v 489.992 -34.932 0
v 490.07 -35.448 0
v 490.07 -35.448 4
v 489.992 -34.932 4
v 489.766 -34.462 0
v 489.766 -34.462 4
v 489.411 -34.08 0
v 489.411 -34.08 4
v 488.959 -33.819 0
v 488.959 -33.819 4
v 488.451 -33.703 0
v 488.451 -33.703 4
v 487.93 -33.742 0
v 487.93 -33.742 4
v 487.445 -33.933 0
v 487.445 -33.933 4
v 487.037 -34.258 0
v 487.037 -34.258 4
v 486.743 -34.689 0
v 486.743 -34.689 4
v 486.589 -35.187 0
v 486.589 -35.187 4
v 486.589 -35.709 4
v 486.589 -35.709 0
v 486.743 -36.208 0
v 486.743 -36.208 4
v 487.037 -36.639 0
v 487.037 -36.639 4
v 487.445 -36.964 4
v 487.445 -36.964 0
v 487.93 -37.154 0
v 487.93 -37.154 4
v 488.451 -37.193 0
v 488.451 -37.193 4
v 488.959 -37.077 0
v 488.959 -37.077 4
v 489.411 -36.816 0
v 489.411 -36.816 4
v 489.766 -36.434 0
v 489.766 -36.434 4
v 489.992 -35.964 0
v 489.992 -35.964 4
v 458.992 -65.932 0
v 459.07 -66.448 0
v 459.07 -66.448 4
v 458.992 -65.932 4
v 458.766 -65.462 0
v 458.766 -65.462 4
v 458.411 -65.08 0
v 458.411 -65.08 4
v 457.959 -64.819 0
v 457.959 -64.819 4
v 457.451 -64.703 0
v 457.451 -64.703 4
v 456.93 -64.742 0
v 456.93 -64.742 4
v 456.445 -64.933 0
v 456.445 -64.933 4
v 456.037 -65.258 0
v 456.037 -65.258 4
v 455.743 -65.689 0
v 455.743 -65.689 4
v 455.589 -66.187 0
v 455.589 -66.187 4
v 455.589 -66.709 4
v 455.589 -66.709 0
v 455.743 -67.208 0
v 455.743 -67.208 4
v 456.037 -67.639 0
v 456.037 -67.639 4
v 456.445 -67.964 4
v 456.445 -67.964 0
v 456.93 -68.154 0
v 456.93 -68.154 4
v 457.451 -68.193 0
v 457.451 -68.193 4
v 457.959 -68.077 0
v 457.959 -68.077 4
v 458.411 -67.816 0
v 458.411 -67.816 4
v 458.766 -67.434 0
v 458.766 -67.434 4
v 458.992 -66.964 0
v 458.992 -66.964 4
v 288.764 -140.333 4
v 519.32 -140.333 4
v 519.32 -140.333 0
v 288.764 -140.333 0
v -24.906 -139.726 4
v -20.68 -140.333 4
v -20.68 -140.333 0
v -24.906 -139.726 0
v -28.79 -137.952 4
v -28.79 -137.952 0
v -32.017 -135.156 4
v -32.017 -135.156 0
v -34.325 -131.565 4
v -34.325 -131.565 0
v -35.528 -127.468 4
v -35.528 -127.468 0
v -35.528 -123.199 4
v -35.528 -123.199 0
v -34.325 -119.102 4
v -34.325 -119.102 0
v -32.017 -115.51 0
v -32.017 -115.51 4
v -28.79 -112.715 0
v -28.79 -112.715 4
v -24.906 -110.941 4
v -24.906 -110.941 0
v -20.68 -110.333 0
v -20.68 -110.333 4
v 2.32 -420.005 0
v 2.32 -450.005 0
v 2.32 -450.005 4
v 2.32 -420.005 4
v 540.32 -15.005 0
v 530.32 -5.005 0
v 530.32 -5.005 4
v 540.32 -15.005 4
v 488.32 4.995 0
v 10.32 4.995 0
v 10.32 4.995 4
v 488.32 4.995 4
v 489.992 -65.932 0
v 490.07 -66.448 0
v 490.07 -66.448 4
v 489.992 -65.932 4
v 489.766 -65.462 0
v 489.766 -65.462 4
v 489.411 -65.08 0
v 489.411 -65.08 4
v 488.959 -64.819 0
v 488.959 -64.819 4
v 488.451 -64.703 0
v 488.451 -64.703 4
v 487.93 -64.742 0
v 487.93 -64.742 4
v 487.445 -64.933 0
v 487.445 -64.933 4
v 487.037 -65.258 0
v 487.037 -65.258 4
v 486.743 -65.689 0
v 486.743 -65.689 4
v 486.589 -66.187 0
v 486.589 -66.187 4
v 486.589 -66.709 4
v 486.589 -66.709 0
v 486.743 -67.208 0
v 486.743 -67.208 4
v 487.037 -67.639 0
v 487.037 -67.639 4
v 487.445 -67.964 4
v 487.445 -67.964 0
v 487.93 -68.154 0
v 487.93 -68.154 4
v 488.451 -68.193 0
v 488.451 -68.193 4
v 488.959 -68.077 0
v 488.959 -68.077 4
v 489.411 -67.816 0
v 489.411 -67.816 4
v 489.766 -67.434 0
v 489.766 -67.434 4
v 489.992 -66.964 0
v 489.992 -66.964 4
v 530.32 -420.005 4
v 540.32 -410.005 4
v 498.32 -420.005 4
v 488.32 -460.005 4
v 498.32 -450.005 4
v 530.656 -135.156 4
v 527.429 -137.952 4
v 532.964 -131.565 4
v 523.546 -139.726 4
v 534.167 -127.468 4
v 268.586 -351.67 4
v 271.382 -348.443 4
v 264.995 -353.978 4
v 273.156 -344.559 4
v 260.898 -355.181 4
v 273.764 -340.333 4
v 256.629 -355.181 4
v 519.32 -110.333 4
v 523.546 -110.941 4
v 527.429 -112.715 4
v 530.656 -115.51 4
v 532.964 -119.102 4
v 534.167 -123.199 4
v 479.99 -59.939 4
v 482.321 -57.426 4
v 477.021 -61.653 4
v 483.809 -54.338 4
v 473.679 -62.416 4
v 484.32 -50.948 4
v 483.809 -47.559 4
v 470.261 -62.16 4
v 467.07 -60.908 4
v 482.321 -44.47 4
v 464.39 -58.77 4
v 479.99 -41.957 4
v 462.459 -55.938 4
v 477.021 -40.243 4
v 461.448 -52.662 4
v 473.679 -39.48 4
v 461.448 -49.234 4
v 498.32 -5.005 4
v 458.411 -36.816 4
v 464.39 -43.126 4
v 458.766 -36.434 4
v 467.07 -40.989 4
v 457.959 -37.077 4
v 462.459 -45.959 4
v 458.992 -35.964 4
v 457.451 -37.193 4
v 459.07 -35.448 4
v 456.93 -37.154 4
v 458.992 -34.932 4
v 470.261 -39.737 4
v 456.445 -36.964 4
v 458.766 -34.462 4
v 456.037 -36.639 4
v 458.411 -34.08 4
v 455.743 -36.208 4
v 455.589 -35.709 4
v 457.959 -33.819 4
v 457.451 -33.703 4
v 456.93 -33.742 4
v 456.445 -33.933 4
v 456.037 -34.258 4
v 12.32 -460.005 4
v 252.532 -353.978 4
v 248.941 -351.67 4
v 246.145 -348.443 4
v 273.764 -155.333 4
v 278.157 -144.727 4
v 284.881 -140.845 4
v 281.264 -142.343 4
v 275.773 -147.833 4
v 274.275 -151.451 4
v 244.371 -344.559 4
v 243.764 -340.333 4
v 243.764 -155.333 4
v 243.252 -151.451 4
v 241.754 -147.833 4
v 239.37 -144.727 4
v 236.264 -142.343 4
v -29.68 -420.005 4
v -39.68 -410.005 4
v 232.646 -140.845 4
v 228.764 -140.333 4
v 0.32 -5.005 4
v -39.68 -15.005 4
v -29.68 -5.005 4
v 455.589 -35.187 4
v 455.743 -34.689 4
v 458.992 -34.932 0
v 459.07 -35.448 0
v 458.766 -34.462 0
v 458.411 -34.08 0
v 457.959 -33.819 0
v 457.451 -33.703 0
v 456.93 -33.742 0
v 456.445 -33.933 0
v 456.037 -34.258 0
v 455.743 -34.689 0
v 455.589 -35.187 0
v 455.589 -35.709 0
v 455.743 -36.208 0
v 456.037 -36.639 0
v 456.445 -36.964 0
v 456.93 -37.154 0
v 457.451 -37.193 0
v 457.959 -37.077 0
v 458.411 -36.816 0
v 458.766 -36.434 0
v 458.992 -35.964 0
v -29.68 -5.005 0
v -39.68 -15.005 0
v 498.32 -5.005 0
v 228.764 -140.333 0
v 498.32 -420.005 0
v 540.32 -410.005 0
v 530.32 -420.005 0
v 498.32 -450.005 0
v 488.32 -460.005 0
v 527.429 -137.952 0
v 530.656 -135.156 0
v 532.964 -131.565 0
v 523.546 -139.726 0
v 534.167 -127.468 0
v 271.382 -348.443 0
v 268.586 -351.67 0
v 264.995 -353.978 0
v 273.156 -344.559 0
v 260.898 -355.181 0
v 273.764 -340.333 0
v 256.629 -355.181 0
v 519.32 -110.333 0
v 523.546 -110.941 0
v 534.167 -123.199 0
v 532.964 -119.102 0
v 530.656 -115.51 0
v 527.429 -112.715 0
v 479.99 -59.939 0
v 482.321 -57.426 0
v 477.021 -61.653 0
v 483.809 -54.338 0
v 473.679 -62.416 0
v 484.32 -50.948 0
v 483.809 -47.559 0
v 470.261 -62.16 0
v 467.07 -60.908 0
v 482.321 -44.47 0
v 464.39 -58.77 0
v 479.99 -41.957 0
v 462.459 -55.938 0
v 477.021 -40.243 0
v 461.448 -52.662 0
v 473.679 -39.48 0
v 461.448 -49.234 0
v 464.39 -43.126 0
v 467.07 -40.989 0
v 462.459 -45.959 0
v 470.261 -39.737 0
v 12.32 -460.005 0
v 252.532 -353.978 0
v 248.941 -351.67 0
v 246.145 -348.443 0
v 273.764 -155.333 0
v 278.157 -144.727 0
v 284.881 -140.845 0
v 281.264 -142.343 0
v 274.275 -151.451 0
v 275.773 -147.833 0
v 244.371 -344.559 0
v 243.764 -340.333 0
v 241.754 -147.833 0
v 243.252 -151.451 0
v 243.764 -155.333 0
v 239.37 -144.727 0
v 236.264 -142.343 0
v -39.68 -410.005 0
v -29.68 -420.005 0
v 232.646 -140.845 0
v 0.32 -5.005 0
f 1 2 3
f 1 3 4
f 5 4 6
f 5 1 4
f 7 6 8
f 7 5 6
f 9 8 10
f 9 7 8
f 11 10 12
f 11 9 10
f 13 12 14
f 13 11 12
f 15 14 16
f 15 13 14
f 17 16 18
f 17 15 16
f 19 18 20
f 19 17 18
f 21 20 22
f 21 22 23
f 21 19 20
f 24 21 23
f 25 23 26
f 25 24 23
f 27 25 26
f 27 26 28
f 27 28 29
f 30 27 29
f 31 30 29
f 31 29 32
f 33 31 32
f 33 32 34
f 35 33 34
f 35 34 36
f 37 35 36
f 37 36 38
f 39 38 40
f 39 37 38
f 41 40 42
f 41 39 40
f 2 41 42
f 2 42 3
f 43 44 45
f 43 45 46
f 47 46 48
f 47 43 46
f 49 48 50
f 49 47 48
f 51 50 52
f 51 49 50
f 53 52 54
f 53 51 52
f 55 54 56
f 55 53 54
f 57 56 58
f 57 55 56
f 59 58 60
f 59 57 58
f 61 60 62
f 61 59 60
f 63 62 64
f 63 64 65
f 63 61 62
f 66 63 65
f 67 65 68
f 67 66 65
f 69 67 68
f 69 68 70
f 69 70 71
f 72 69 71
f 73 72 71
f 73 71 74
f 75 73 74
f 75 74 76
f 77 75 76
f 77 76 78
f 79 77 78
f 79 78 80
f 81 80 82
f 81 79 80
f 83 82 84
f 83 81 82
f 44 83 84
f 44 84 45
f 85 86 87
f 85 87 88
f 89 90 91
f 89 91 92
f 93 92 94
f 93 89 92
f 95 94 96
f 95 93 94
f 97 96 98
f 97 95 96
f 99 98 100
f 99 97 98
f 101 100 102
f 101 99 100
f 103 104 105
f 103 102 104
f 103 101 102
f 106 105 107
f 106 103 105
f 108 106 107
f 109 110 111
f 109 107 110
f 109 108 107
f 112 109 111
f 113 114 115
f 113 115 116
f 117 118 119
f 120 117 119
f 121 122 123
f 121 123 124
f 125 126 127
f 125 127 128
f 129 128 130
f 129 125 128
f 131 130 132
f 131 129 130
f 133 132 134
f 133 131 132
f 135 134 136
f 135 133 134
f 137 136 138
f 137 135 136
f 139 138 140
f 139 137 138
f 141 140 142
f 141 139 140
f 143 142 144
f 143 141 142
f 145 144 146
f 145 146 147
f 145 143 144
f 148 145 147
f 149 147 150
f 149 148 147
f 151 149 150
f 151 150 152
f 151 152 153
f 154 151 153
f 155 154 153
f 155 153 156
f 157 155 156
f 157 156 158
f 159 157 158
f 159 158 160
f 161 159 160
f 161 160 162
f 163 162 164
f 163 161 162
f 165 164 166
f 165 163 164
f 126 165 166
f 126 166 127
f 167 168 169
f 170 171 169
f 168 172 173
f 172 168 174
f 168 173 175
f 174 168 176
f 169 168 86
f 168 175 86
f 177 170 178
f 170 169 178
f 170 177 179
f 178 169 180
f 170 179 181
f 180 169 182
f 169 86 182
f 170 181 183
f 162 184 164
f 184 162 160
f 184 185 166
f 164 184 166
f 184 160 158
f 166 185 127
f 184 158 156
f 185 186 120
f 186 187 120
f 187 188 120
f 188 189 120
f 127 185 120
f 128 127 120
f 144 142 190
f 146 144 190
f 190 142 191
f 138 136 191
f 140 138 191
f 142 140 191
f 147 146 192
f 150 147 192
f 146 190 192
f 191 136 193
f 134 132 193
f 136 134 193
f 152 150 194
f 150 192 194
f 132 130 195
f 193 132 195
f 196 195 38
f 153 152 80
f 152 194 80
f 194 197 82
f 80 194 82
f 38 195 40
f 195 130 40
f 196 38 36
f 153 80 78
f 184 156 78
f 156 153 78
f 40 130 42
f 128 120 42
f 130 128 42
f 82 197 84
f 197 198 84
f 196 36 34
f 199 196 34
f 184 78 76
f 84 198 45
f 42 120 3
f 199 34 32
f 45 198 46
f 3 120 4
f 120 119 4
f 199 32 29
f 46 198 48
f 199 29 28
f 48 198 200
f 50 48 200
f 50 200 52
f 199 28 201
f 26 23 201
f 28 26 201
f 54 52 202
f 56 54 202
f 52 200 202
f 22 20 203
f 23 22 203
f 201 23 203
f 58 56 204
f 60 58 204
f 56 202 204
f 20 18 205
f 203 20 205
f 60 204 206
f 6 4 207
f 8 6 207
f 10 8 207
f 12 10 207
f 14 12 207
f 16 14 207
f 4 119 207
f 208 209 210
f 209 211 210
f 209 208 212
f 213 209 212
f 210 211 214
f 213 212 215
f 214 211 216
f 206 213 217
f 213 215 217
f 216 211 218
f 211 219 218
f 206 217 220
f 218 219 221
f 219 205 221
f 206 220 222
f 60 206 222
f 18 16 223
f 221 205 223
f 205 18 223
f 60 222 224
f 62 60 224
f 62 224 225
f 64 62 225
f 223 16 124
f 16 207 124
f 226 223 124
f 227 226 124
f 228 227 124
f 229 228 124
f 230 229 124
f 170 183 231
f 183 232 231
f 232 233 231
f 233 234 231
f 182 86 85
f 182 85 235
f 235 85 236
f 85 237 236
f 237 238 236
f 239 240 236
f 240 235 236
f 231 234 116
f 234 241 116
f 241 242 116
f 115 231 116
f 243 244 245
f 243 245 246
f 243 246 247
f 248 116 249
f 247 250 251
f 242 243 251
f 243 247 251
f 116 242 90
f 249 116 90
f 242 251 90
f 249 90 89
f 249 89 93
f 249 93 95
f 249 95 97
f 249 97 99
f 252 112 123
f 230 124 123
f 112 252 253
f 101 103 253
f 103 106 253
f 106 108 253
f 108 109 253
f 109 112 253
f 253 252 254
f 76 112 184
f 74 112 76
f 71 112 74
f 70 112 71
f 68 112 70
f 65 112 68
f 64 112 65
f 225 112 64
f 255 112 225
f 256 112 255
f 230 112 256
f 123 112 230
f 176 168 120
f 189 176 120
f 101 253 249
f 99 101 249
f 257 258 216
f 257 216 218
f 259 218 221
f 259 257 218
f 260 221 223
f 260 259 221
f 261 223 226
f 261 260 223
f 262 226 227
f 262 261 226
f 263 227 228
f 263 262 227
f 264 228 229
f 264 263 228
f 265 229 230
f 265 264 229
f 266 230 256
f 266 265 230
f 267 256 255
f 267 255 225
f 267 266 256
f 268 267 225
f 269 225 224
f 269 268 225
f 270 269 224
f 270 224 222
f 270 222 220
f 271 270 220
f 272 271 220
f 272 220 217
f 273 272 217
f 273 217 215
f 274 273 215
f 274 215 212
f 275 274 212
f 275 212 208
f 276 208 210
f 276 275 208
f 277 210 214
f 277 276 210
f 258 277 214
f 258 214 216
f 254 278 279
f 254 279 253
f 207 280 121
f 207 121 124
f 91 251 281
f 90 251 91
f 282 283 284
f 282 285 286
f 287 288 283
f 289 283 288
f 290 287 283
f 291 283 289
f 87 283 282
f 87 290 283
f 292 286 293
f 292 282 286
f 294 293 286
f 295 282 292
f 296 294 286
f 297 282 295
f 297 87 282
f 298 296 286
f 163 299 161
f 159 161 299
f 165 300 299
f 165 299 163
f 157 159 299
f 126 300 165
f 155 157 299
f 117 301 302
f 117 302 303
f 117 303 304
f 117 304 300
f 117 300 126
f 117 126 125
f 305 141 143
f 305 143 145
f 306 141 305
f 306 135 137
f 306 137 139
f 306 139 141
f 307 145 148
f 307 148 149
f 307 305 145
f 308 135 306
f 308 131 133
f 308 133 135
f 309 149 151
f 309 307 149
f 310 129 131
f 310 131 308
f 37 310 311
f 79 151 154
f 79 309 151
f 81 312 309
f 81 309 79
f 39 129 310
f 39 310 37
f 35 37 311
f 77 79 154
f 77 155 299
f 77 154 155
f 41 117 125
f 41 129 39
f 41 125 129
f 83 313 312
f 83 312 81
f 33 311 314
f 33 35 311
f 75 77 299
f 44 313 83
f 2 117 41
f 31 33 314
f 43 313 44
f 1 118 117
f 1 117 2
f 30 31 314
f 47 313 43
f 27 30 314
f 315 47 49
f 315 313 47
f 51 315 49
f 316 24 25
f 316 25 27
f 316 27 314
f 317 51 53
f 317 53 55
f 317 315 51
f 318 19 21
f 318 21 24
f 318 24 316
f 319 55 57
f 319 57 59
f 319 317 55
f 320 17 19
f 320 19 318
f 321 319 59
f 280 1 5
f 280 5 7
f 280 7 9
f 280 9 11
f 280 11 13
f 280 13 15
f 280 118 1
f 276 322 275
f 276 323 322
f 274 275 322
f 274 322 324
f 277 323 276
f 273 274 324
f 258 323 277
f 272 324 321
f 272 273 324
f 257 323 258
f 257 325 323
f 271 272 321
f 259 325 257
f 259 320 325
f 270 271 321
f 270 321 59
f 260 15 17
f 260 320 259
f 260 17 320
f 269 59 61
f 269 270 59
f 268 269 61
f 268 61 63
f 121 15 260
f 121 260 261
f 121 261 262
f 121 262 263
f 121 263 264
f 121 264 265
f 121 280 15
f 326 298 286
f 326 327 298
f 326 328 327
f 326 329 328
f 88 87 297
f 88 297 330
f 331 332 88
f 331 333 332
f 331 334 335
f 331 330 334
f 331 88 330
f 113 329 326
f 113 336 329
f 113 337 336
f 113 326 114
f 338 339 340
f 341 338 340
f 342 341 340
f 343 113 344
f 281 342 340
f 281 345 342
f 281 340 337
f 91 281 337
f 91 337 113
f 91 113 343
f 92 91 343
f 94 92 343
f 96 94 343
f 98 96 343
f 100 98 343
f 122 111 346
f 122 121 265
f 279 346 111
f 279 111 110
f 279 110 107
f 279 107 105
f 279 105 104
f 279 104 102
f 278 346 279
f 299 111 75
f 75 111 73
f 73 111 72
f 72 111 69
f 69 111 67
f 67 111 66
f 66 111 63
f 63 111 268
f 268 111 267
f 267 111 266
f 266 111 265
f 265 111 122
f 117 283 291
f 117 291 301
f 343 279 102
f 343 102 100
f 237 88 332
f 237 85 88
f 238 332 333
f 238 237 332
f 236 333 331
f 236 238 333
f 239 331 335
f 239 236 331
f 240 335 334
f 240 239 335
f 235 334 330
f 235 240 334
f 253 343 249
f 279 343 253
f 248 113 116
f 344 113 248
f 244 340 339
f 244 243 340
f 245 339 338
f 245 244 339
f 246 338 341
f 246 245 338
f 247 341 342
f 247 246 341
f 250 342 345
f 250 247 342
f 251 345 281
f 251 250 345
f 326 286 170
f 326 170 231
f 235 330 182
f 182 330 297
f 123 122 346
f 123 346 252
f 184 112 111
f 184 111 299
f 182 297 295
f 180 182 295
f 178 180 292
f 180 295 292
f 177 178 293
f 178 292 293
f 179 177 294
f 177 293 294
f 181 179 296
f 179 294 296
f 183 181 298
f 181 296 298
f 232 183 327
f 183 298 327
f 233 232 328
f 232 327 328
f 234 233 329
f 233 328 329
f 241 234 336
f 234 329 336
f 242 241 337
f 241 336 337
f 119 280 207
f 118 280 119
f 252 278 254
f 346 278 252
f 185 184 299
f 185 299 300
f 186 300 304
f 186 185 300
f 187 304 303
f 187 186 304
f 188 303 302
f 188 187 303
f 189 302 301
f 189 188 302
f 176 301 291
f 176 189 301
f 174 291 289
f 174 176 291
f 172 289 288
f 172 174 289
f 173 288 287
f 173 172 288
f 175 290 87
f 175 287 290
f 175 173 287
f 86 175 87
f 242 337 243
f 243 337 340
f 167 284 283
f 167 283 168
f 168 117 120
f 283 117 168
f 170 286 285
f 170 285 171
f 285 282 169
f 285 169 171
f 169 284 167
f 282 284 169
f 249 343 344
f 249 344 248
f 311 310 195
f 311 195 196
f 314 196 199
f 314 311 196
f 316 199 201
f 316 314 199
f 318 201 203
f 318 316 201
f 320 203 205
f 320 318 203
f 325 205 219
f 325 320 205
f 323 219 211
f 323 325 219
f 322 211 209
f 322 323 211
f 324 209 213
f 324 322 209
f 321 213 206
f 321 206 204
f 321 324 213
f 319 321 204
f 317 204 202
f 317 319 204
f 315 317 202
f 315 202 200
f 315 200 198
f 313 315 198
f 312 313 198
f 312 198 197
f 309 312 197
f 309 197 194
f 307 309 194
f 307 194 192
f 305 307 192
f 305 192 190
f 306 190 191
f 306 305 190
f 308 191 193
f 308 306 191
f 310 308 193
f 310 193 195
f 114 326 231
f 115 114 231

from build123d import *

# Parameters (mm, degrees)
SKETCH1_R           = 1.75
SKETCH1_R_2         = 11.5
BOSS_EXTRUDE1_DEPTH = 4
CHAMFER1_SIZE       = 10
CHAMFER2_SIZE       = 10
CUT_EXTRUDE1_DEPTH  = 10
CUT_EXTRUDE2_DEPTH  = 10
FILLET1_R           = 15


with BuildPart() as part:
    # Sketch1 → Boss-Extrude1 (new body)
    with BuildSketch(Plane.XY):
        Polygon((-39.680258263, -5.004819249), (0.319741737, -5.004819249), (0.319741737, 4.995180751), (498.319741737, 4.995180751), (498.319741737, -5.004819249), (540.319741737, -5.004819249), (540.319741737, -420.004819249), (498.319741737, -420.004819249), (498.319741737, -460.004819249), (2.319741737, -460.004819249), (2.319741737, -420.004819249), (-39.680258263, -420.004819249), align=None)
        with Locations((457.319741737, -35.448212978)):
            Circle(SKETCH1_R, mode=Mode.SUBTRACT)
        with Locations((457.319741737, -66.448212978)):
            Circle(SKETCH1_R, mode=Mode.SUBTRACT)
        with Locations((488.319741737, -66.448212978)):
            Circle(SKETCH1_R, mode=Mode.SUBTRACT)
        with Locations((488.319741737, -35.448212978)):
            Circle(SKETCH1_R, mode=Mode.SUBTRACT)
        with Locations((472.819741737, -50.948212978)):
            Circle(SKETCH1_R_2, mode=Mode.SUBTRACT)
    extrude(amount=BOSS_EXTRUDE1_DEPTH)

    # Chamfer1
    chamfer1_edges = [part.edges().sort_by_distance(p)[0] for p in [
        (498.319741737, 4.995180751, 2),
        (0.319741737, 4.995180751, 2),
    ]]
    chamfer(chamfer1_edges, length=CHAMFER1_SIZE - 0.0001)  # a hair under: the kernel refuses the full size

    # Chamfer2
    chamfer2_edges = [part.edges().sort_by_distance(p)[0] for p in [
        (540.319741737, -5.004819249, 2),
        (540.319741737, -420.004819249, 2),
        (498.319741737, -460.004819249, 2),
        (2.319741737, -460.004819249, 2),
        (-39.680258263, -420.004819249, 2),
        (-39.680258263, -5.004819249, 2),
    ]]
    chamfer(chamfer2_edges, length=CHAMFER2_SIZE)

    # Sketch2 → Cut-Extrude1 (cut)
    with BuildSketch(Plane.XY.offset(4)):
        with BuildLine():
            Line((-20.680258263, -110.333406017), (519.319741737, -110.333406017))
            ThreePointArc((519.319741737, -110.333406017), (534.319741737, -125.333406017), (519.319741737, -140.333406017))
            Line((519.319741737, -140.333406017), (-20.680258263, -140.333406017))
            ThreePointArc((-20.680258263, -140.333406017), (-35.680258263, -125.333406017), (-20.680258263, -110.333406017))
        make_face()
    extrude(amount=-CUT_EXTRUDE1_DEPTH, mode=Mode.SUBTRACT)

    # Sketch3 → Cut-Extrude2 (cut)
    with BuildSketch(Plane(origin=(0, 0, 0), x_dir=(-1, 0, 0), z_dir=(0, 0, -1))):
        with BuildLine():
            Line((-273.763542149, -140.333406017), (-273.763542149, -340.333406017))
            ThreePointArc((-273.763542149, -340.333406017), (-258.763542149, -355.333406017), (-243.763542149, -340.333406017))
            Line((-243.763542149, -340.333406017), (-243.763542149, -140.333406017))
            Line((-243.763542149, -140.333406017), (-273.763542149, -140.333406017))
        make_face()
    extrude(amount=-CUT_EXTRUDE2_DEPTH, mode=Mode.SUBTRACT)

    # Fillet1
    fillet1_edges = [part.edges().sort_by_distance(p)[0] for p in [
        (273.763542149, -140.333406017, 2),
        (243.763542149, -140.333406017, 2),
    ]]
    fillet(fillet1_edges, radius=FILLET1_R)


solid = part.part
